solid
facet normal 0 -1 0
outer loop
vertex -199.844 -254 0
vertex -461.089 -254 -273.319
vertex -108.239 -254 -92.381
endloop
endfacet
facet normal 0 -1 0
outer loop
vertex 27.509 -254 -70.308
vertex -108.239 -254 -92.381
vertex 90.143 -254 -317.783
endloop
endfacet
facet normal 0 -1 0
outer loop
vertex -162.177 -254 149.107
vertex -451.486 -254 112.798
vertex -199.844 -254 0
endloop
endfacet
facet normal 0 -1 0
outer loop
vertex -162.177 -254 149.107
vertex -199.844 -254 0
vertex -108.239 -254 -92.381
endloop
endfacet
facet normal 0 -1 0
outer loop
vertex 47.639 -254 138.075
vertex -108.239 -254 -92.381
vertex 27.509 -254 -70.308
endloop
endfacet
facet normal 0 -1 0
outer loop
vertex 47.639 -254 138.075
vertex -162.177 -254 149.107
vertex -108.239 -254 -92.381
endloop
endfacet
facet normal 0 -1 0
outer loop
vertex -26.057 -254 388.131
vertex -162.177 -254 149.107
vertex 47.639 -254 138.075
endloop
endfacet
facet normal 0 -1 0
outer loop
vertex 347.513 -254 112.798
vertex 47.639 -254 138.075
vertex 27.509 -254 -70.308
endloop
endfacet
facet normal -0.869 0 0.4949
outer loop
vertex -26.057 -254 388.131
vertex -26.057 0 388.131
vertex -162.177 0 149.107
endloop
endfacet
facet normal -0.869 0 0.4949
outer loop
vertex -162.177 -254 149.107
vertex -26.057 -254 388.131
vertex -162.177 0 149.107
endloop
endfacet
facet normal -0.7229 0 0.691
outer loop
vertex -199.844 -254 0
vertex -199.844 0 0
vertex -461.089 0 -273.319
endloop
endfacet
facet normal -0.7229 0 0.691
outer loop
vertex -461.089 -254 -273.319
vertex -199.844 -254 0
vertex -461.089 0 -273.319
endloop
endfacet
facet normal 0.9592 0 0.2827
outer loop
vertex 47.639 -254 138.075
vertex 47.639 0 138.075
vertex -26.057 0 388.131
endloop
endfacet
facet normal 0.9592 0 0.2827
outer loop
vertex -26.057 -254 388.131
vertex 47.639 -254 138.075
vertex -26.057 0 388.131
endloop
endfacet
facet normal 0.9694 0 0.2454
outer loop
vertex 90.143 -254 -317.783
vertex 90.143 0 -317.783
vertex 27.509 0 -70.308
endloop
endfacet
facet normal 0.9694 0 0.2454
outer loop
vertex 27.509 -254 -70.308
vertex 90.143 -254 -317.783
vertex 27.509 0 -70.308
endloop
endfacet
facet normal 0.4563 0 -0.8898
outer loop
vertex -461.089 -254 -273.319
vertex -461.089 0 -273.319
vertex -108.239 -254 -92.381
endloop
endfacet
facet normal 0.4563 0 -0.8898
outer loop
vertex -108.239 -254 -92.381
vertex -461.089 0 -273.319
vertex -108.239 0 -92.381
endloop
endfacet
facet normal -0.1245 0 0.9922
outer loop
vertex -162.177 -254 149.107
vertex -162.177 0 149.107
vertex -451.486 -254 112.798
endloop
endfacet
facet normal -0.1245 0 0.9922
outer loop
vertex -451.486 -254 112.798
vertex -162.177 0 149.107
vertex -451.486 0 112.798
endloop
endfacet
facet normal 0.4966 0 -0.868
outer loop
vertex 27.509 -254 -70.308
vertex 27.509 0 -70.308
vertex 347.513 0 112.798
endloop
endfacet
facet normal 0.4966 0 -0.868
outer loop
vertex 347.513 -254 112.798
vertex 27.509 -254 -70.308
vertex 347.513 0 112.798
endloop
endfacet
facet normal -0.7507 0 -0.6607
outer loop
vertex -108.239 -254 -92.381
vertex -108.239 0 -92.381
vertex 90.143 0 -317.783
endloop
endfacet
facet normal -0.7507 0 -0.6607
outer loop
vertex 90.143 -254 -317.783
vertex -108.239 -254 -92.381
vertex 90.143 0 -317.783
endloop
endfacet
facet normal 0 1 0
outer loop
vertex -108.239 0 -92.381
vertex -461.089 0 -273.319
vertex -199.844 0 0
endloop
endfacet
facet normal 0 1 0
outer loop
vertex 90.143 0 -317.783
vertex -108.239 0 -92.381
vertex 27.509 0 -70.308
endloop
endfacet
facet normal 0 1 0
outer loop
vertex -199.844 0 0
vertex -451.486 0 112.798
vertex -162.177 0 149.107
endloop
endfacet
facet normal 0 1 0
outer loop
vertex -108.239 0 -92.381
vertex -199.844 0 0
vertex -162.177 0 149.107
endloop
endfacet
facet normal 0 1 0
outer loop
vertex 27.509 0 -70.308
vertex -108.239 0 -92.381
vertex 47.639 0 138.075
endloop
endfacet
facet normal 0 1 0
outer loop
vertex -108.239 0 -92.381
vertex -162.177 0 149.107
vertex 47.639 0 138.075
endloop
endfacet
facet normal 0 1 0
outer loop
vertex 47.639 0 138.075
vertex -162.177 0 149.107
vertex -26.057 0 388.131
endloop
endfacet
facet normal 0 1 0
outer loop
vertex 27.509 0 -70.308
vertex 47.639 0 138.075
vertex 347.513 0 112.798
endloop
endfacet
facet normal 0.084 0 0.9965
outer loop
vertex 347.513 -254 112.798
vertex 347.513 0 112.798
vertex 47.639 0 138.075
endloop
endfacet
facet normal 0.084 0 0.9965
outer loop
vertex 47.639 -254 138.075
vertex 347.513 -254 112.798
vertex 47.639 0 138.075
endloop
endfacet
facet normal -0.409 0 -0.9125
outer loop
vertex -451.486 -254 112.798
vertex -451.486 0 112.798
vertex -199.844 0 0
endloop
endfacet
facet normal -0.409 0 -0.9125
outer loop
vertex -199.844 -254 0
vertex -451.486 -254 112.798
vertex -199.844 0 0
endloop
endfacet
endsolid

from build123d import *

# Parameters (mm, degrees)
F1_DEPTH = 254


with BuildPart() as f1:
    # F0 (on Front) → F1 (new body)
    with BuildSketch(Plane.XZ):
        with BuildLine():
            ThreePointArc((-162.177067, 149.106595), (-54.889921, 188.841494), (47.638746, 138.074711))
            Line((47.638746, 138.074711), (-26.05729, 388.13132))
            Line((-26.05729, 388.13132), (-162.177067, 149.106595))
        make_face()
        with BuildLine():
            Line((-461.089432, -273.319095), (-108.239205, -92.380688))
            ThreePointArc((-108.239205, -92.380688), (-165.032116, -57.088534), (-199.844044, 0))
            Line((-199.844044, 0), (-461.089432, -273.319095))
        make_face()
        with BuildLine():
            ThreePointArc((47.638746, 138.074711), (73.107329, 94.392598), (81.95847, 44.608735))
            ThreePointArc((81.95847, 44.608735), (21.937886, -72.589023), (-108.239205, -92.380688))
            Line((-108.239205, -92.380688), (90.14336, -317.783058))
            Line((90.14336, -317.783058), (27.508762, -70.308436))
            Line((27.508762, -70.308436), (347.513378, 112.797849))
            Line((347.513378, 112.797849), (47.638746, 138.074711))
        make_face()
        with BuildLine():
            ThreePointArc((-108.239205, -92.380688), (21.937886, -72.589023), (81.95847, 44.608735))
            ThreePointArc((81.95847, 44.608735), (73.107329, 94.392598), (47.638746, 138.074711))
            ThreePointArc((47.638746, 138.074711), (-54.889921, 188.841494), (-162.177067, 149.106595))
            ThreePointArc((-162.177067, 149.106595), (-202.506455, 79.983544), (-199.844044, 0))
            ThreePointArc((-199.844044, 0), (-165.032116, -57.088534), (-108.239205, -92.380688))
        make_face()
        with BuildLine():
            ThreePointArc((-199.844044, 0), (-202.506455, 79.983544), (-162.177067, 149.106595))
            Line((-162.177067, 149.106595), (-451.486111, 112.797849))
            Line((-451.486111, 112.797849), (-199.844044, 0))
        make_face()
    extrude(amount=F1_DEPTH)


solid = f1.part
